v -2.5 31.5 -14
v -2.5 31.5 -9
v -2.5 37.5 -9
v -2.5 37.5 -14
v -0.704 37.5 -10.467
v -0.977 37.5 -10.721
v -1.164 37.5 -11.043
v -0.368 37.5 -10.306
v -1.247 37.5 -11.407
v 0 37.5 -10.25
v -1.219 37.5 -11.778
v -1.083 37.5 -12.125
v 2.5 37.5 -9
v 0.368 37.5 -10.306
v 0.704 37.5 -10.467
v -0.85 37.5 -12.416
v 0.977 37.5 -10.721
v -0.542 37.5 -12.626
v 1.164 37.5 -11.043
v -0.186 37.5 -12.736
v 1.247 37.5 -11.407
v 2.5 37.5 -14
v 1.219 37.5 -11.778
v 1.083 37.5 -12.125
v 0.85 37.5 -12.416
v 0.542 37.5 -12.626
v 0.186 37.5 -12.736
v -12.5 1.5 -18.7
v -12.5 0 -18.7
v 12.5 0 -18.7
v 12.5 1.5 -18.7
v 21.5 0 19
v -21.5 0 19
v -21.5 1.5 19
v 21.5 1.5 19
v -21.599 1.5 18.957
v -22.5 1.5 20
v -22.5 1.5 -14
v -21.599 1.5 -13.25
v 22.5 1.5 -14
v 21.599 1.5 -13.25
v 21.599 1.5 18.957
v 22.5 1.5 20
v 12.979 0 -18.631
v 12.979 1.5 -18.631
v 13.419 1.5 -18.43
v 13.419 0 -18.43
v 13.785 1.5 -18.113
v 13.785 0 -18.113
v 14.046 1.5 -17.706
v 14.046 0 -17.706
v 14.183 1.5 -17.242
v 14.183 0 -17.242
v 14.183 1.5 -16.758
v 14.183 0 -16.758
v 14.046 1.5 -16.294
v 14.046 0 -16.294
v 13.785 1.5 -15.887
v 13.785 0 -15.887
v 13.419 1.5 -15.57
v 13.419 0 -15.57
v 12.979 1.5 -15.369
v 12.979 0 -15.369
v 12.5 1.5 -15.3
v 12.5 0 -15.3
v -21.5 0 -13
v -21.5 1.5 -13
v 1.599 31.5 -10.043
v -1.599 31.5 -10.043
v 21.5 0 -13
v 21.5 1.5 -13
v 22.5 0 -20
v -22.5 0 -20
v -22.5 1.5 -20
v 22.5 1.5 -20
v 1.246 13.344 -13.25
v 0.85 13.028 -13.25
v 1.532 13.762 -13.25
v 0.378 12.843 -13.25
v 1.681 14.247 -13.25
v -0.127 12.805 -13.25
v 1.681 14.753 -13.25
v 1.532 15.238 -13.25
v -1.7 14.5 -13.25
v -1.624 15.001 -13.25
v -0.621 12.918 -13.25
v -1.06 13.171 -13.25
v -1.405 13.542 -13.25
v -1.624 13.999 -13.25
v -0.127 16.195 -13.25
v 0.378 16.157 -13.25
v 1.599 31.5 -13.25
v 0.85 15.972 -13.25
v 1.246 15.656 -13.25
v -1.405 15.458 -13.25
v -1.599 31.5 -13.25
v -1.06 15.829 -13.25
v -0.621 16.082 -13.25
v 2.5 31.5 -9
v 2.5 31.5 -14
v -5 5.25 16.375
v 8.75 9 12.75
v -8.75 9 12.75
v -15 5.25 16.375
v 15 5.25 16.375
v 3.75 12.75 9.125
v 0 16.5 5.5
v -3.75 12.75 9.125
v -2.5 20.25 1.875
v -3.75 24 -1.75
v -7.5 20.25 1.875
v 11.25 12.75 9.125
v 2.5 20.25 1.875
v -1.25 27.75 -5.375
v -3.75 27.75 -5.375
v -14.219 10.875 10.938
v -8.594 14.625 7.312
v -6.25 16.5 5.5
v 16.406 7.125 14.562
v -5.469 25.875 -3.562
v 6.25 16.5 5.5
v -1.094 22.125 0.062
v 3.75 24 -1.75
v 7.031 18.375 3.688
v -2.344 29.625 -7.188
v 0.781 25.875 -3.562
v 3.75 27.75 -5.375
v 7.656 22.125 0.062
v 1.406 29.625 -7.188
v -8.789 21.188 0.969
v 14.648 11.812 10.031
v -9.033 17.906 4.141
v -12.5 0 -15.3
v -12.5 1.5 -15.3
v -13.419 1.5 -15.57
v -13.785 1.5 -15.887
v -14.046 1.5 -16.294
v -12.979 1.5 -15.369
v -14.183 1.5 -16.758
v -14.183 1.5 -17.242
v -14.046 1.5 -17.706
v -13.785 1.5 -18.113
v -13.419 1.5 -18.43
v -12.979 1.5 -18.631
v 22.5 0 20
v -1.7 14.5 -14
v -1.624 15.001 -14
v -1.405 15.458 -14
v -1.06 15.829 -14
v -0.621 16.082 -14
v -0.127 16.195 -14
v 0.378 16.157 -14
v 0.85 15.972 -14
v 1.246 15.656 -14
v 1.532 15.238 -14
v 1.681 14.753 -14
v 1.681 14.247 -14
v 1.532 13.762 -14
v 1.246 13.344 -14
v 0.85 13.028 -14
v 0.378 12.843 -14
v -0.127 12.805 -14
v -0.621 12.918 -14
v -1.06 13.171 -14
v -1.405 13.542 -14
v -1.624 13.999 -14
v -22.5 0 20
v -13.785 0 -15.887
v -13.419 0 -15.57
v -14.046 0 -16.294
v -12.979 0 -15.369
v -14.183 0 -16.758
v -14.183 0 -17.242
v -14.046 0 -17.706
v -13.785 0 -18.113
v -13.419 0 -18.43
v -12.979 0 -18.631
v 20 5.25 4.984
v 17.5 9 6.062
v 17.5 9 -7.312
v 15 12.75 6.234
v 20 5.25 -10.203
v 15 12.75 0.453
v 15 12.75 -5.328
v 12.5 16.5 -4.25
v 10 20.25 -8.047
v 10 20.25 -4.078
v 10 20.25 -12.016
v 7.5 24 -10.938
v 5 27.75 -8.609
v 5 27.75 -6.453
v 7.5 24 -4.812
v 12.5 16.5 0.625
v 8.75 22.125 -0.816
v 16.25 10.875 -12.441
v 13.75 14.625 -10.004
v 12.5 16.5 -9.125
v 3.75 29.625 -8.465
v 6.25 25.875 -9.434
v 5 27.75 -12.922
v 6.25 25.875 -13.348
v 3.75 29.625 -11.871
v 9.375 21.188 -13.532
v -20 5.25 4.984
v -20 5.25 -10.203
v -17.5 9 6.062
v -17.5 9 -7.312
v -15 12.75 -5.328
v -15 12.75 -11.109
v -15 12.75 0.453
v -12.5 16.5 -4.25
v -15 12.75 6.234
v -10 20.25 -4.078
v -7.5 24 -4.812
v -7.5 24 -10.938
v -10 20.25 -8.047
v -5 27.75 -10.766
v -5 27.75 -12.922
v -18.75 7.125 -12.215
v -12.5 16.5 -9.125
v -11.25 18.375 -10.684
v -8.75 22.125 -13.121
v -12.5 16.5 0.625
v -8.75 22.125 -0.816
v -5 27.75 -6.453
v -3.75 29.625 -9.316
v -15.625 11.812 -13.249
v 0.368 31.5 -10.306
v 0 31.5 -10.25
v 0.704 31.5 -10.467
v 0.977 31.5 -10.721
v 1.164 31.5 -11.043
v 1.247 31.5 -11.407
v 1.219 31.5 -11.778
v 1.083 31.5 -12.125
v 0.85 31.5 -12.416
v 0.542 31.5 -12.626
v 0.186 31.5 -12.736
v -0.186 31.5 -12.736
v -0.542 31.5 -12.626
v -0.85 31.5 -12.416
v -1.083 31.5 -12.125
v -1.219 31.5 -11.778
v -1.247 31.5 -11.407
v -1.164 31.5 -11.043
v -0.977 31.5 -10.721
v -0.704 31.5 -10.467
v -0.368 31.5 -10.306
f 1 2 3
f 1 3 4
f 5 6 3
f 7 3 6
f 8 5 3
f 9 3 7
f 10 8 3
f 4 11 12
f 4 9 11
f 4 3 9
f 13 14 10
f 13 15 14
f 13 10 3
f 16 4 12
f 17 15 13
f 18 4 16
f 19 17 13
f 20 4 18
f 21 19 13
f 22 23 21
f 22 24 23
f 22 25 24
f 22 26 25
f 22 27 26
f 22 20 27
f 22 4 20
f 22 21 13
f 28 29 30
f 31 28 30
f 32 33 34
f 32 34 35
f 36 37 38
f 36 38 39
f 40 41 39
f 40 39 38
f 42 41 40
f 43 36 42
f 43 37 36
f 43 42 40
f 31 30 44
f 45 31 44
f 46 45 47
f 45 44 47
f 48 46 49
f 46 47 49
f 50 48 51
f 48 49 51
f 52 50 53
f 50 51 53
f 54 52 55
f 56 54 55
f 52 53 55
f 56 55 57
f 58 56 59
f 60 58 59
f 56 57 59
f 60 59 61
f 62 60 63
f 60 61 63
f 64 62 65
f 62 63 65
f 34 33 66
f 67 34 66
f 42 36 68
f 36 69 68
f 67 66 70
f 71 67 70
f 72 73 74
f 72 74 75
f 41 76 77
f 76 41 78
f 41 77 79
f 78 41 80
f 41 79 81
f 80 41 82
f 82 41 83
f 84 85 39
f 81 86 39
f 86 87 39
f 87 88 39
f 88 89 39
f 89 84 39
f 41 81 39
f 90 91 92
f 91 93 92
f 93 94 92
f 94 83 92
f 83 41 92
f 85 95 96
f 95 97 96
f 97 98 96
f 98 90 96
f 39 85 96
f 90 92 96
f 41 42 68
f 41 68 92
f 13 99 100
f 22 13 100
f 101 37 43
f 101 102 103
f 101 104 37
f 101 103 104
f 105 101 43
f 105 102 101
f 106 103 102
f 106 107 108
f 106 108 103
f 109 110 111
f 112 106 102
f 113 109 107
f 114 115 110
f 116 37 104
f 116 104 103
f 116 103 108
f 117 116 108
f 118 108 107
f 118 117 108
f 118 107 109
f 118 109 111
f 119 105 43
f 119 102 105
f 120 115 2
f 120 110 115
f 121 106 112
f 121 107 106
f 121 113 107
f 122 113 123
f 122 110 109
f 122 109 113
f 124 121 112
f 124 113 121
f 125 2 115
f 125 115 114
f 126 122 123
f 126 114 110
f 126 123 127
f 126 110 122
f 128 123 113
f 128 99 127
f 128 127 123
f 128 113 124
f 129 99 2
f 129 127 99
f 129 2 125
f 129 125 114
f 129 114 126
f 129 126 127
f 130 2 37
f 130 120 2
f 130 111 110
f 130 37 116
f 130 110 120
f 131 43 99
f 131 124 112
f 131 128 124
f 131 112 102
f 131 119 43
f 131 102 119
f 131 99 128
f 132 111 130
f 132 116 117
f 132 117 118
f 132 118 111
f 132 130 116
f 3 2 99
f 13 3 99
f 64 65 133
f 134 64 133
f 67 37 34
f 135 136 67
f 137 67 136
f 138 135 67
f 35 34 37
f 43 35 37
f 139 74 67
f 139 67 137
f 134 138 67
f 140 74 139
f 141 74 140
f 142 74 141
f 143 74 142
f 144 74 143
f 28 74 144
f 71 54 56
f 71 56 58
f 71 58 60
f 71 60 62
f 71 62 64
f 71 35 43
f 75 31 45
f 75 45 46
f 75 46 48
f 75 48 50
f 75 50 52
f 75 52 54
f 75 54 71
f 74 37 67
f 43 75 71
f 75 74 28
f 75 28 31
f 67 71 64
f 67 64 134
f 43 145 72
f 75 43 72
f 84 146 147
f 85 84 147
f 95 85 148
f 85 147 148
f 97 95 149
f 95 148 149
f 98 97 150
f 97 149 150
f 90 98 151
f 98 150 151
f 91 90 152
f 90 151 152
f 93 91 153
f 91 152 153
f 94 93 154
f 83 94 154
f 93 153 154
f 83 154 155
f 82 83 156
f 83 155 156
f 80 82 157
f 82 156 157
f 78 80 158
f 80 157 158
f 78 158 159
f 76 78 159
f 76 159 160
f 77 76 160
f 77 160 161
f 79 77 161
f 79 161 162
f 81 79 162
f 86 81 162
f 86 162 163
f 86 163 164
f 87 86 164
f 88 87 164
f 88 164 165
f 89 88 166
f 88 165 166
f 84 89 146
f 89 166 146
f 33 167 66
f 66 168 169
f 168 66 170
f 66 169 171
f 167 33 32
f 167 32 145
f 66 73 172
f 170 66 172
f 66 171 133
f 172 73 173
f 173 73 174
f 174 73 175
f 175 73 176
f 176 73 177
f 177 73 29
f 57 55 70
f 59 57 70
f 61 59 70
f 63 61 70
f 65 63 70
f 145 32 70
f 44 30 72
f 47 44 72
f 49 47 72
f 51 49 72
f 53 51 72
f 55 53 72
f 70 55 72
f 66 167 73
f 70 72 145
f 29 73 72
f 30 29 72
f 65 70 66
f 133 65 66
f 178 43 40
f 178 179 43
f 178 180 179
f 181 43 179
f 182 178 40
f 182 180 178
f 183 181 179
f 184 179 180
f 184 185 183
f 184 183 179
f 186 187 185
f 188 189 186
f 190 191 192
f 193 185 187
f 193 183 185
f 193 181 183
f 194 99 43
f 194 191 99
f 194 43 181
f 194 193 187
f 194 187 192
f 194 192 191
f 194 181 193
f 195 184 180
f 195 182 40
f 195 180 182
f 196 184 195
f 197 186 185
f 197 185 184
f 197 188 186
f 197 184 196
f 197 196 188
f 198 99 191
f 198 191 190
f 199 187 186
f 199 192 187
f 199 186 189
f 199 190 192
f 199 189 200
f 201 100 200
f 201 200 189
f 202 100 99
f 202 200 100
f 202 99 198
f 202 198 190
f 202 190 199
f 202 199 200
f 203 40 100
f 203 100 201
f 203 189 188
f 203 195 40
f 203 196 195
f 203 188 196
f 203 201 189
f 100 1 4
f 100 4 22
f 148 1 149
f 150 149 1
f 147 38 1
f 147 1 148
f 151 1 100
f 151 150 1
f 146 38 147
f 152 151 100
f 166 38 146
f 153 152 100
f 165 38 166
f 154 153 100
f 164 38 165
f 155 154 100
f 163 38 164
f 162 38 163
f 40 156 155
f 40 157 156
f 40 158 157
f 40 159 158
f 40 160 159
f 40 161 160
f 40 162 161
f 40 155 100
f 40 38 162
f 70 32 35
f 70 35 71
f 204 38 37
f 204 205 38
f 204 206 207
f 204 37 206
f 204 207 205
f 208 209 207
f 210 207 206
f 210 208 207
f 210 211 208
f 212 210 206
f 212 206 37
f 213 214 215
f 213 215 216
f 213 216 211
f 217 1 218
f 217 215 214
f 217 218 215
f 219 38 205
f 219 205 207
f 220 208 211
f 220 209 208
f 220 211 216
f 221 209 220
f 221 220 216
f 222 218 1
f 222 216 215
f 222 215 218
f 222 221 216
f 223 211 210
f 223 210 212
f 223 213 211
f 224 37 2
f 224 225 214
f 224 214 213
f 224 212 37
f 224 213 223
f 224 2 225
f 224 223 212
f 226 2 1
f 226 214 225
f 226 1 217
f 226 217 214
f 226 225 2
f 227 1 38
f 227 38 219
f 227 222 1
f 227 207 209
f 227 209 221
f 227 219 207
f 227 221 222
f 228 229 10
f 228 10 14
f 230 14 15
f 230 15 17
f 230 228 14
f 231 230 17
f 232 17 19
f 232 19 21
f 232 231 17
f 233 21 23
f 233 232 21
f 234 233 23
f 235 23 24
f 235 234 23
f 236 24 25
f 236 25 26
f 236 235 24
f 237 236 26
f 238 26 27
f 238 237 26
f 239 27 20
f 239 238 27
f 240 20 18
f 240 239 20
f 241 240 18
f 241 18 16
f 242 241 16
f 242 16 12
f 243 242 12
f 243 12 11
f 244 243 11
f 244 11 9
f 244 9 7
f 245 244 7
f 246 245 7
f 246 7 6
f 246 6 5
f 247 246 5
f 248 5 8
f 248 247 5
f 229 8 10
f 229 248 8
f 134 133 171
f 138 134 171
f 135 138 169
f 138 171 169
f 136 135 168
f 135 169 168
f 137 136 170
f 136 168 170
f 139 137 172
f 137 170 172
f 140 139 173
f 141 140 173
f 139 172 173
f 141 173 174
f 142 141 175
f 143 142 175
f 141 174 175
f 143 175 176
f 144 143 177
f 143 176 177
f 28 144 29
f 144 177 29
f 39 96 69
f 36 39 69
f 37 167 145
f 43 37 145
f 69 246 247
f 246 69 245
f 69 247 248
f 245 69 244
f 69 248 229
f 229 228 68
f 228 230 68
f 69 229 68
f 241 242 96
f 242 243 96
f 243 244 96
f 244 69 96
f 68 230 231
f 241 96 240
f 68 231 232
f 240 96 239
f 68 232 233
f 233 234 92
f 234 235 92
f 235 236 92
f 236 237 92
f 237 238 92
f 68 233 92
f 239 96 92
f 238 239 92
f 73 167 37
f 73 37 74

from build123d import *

# Parameters (mm, degrees)
SKETCH1_W           = 45
SKETCH1_H           = 40
SKETCH1_W_2         = 43
SKETCH1_H_2         = 32
BOSS_EXTRUDE1_DEPTH = 1.5
SHELL3_T            = -0.75
SKETCH7_W           = 5
SKETCH7_H           = 5
SKETCH7_R           = 1.25
BOSS_EXTRUDE2_DEPTH = 6
SKETCH8_R           = 1.7
CUT_EXTRUDE1_DEPTH  = 0.75


with BuildPart() as part:
    # Sketch1 → Boss-Extrude1 (new body)
    with BuildSketch(Plane(origin=(0, 0, 0), x_dir=(1, 0, 0), z_dir=(0, 1, 0))):
        Rectangle(SKETCH1_W, SKETCH1_H)
        with Locations((0, -3)):
            Rectangle(SKETCH1_W_2, SKETCH1_H_2, mode=Mode.SUBTRACT)
        with BuildLine():
            Line((-12.5, 18.7), (12.5, 18.7))
            ThreePointArc((12.5, 18.7), (14.2, 17), (12.5, 15.3))
            Line((12.5, 15.3), (-12.5, 15.3))
            ThreePointArc((-12.5, 15.3), (-14.2, 17), (-12.5, 18.7))
        make_face(mode=Mode.SUBTRACT)
    extrude(amount=BOSS_EXTRUDE1_DEPTH)


with BuildPart() as body_2:
    # Sketch5 → Loft3 section 0
    with BuildSketch(Plane(origin=(0, 1.5, 0), x_dir=(1, 0, 0), z_dir=(0, 1, 0))):
        with BuildLine():
            Line((-22.5, -20), (22.5, -20))
            Line((22.5, -20), (22.5, 14))
            Line((22.5, 14), (-22.5, 14))
            Line((-22.5, 14), (-22.5, -20))
        make_face()
    # Sketch6 → Loft3 section 1
    with BuildSketch(Plane(origin=(0, 31.5, 0), x_dir=(1, 0, 0), z_dir=(0, 1, 0))):
        with BuildLine():
            Line((-2.5, 9), (2.5, 9))
            Line((2.5, 9), (2.5, 14))
            Line((2.5, 14), (-2.5, 14))
            Line((-2.5, 14), (-2.5, 9))
        make_face()
    loft()

    # Shell3
    shell3_openings = [body_2.faces().sort_by_distance(p)[0] for p in [
        (0, 31.5, -11.5),
        (0, 1.5, 3),
    ]]
    offset(amount=SHELL3_T, openings=shell3_openings, kind=Kind.INTERSECTION)

    # Sketch7 → Boss-Extrude2 (add)
    with BuildSketch(Plane(origin=(0, 31.5, 0), x_dir=(1, 0, 0), z_dir=(0, 1, 0))):
        with Locations((0, 11.5)):
            Rectangle(SKETCH7_W, SKETCH7_H)
        with Locations(Location((0, 11.5, 0), (0, 0, 270))):
            Circle(SKETCH7_R, mode=Mode.SUBTRACT)
    extrude(amount=BOSS_EXTRUDE2_DEPTH)

    # Sketch8 → Cut-Extrude1 (cut)
    with BuildSketch(Plane(origin=(0, 0, -14), x_dir=(-1, 0, 0), z_dir=(0, 0, -1))):
        with Locations((0, 14.5)):
            Circle(SKETCH8_R)
    extrude(amount=-CUT_EXTRUDE1_DEPTH, mode=Mode.SUBTRACT)


solid = Compound([part.part, body_2.part])
